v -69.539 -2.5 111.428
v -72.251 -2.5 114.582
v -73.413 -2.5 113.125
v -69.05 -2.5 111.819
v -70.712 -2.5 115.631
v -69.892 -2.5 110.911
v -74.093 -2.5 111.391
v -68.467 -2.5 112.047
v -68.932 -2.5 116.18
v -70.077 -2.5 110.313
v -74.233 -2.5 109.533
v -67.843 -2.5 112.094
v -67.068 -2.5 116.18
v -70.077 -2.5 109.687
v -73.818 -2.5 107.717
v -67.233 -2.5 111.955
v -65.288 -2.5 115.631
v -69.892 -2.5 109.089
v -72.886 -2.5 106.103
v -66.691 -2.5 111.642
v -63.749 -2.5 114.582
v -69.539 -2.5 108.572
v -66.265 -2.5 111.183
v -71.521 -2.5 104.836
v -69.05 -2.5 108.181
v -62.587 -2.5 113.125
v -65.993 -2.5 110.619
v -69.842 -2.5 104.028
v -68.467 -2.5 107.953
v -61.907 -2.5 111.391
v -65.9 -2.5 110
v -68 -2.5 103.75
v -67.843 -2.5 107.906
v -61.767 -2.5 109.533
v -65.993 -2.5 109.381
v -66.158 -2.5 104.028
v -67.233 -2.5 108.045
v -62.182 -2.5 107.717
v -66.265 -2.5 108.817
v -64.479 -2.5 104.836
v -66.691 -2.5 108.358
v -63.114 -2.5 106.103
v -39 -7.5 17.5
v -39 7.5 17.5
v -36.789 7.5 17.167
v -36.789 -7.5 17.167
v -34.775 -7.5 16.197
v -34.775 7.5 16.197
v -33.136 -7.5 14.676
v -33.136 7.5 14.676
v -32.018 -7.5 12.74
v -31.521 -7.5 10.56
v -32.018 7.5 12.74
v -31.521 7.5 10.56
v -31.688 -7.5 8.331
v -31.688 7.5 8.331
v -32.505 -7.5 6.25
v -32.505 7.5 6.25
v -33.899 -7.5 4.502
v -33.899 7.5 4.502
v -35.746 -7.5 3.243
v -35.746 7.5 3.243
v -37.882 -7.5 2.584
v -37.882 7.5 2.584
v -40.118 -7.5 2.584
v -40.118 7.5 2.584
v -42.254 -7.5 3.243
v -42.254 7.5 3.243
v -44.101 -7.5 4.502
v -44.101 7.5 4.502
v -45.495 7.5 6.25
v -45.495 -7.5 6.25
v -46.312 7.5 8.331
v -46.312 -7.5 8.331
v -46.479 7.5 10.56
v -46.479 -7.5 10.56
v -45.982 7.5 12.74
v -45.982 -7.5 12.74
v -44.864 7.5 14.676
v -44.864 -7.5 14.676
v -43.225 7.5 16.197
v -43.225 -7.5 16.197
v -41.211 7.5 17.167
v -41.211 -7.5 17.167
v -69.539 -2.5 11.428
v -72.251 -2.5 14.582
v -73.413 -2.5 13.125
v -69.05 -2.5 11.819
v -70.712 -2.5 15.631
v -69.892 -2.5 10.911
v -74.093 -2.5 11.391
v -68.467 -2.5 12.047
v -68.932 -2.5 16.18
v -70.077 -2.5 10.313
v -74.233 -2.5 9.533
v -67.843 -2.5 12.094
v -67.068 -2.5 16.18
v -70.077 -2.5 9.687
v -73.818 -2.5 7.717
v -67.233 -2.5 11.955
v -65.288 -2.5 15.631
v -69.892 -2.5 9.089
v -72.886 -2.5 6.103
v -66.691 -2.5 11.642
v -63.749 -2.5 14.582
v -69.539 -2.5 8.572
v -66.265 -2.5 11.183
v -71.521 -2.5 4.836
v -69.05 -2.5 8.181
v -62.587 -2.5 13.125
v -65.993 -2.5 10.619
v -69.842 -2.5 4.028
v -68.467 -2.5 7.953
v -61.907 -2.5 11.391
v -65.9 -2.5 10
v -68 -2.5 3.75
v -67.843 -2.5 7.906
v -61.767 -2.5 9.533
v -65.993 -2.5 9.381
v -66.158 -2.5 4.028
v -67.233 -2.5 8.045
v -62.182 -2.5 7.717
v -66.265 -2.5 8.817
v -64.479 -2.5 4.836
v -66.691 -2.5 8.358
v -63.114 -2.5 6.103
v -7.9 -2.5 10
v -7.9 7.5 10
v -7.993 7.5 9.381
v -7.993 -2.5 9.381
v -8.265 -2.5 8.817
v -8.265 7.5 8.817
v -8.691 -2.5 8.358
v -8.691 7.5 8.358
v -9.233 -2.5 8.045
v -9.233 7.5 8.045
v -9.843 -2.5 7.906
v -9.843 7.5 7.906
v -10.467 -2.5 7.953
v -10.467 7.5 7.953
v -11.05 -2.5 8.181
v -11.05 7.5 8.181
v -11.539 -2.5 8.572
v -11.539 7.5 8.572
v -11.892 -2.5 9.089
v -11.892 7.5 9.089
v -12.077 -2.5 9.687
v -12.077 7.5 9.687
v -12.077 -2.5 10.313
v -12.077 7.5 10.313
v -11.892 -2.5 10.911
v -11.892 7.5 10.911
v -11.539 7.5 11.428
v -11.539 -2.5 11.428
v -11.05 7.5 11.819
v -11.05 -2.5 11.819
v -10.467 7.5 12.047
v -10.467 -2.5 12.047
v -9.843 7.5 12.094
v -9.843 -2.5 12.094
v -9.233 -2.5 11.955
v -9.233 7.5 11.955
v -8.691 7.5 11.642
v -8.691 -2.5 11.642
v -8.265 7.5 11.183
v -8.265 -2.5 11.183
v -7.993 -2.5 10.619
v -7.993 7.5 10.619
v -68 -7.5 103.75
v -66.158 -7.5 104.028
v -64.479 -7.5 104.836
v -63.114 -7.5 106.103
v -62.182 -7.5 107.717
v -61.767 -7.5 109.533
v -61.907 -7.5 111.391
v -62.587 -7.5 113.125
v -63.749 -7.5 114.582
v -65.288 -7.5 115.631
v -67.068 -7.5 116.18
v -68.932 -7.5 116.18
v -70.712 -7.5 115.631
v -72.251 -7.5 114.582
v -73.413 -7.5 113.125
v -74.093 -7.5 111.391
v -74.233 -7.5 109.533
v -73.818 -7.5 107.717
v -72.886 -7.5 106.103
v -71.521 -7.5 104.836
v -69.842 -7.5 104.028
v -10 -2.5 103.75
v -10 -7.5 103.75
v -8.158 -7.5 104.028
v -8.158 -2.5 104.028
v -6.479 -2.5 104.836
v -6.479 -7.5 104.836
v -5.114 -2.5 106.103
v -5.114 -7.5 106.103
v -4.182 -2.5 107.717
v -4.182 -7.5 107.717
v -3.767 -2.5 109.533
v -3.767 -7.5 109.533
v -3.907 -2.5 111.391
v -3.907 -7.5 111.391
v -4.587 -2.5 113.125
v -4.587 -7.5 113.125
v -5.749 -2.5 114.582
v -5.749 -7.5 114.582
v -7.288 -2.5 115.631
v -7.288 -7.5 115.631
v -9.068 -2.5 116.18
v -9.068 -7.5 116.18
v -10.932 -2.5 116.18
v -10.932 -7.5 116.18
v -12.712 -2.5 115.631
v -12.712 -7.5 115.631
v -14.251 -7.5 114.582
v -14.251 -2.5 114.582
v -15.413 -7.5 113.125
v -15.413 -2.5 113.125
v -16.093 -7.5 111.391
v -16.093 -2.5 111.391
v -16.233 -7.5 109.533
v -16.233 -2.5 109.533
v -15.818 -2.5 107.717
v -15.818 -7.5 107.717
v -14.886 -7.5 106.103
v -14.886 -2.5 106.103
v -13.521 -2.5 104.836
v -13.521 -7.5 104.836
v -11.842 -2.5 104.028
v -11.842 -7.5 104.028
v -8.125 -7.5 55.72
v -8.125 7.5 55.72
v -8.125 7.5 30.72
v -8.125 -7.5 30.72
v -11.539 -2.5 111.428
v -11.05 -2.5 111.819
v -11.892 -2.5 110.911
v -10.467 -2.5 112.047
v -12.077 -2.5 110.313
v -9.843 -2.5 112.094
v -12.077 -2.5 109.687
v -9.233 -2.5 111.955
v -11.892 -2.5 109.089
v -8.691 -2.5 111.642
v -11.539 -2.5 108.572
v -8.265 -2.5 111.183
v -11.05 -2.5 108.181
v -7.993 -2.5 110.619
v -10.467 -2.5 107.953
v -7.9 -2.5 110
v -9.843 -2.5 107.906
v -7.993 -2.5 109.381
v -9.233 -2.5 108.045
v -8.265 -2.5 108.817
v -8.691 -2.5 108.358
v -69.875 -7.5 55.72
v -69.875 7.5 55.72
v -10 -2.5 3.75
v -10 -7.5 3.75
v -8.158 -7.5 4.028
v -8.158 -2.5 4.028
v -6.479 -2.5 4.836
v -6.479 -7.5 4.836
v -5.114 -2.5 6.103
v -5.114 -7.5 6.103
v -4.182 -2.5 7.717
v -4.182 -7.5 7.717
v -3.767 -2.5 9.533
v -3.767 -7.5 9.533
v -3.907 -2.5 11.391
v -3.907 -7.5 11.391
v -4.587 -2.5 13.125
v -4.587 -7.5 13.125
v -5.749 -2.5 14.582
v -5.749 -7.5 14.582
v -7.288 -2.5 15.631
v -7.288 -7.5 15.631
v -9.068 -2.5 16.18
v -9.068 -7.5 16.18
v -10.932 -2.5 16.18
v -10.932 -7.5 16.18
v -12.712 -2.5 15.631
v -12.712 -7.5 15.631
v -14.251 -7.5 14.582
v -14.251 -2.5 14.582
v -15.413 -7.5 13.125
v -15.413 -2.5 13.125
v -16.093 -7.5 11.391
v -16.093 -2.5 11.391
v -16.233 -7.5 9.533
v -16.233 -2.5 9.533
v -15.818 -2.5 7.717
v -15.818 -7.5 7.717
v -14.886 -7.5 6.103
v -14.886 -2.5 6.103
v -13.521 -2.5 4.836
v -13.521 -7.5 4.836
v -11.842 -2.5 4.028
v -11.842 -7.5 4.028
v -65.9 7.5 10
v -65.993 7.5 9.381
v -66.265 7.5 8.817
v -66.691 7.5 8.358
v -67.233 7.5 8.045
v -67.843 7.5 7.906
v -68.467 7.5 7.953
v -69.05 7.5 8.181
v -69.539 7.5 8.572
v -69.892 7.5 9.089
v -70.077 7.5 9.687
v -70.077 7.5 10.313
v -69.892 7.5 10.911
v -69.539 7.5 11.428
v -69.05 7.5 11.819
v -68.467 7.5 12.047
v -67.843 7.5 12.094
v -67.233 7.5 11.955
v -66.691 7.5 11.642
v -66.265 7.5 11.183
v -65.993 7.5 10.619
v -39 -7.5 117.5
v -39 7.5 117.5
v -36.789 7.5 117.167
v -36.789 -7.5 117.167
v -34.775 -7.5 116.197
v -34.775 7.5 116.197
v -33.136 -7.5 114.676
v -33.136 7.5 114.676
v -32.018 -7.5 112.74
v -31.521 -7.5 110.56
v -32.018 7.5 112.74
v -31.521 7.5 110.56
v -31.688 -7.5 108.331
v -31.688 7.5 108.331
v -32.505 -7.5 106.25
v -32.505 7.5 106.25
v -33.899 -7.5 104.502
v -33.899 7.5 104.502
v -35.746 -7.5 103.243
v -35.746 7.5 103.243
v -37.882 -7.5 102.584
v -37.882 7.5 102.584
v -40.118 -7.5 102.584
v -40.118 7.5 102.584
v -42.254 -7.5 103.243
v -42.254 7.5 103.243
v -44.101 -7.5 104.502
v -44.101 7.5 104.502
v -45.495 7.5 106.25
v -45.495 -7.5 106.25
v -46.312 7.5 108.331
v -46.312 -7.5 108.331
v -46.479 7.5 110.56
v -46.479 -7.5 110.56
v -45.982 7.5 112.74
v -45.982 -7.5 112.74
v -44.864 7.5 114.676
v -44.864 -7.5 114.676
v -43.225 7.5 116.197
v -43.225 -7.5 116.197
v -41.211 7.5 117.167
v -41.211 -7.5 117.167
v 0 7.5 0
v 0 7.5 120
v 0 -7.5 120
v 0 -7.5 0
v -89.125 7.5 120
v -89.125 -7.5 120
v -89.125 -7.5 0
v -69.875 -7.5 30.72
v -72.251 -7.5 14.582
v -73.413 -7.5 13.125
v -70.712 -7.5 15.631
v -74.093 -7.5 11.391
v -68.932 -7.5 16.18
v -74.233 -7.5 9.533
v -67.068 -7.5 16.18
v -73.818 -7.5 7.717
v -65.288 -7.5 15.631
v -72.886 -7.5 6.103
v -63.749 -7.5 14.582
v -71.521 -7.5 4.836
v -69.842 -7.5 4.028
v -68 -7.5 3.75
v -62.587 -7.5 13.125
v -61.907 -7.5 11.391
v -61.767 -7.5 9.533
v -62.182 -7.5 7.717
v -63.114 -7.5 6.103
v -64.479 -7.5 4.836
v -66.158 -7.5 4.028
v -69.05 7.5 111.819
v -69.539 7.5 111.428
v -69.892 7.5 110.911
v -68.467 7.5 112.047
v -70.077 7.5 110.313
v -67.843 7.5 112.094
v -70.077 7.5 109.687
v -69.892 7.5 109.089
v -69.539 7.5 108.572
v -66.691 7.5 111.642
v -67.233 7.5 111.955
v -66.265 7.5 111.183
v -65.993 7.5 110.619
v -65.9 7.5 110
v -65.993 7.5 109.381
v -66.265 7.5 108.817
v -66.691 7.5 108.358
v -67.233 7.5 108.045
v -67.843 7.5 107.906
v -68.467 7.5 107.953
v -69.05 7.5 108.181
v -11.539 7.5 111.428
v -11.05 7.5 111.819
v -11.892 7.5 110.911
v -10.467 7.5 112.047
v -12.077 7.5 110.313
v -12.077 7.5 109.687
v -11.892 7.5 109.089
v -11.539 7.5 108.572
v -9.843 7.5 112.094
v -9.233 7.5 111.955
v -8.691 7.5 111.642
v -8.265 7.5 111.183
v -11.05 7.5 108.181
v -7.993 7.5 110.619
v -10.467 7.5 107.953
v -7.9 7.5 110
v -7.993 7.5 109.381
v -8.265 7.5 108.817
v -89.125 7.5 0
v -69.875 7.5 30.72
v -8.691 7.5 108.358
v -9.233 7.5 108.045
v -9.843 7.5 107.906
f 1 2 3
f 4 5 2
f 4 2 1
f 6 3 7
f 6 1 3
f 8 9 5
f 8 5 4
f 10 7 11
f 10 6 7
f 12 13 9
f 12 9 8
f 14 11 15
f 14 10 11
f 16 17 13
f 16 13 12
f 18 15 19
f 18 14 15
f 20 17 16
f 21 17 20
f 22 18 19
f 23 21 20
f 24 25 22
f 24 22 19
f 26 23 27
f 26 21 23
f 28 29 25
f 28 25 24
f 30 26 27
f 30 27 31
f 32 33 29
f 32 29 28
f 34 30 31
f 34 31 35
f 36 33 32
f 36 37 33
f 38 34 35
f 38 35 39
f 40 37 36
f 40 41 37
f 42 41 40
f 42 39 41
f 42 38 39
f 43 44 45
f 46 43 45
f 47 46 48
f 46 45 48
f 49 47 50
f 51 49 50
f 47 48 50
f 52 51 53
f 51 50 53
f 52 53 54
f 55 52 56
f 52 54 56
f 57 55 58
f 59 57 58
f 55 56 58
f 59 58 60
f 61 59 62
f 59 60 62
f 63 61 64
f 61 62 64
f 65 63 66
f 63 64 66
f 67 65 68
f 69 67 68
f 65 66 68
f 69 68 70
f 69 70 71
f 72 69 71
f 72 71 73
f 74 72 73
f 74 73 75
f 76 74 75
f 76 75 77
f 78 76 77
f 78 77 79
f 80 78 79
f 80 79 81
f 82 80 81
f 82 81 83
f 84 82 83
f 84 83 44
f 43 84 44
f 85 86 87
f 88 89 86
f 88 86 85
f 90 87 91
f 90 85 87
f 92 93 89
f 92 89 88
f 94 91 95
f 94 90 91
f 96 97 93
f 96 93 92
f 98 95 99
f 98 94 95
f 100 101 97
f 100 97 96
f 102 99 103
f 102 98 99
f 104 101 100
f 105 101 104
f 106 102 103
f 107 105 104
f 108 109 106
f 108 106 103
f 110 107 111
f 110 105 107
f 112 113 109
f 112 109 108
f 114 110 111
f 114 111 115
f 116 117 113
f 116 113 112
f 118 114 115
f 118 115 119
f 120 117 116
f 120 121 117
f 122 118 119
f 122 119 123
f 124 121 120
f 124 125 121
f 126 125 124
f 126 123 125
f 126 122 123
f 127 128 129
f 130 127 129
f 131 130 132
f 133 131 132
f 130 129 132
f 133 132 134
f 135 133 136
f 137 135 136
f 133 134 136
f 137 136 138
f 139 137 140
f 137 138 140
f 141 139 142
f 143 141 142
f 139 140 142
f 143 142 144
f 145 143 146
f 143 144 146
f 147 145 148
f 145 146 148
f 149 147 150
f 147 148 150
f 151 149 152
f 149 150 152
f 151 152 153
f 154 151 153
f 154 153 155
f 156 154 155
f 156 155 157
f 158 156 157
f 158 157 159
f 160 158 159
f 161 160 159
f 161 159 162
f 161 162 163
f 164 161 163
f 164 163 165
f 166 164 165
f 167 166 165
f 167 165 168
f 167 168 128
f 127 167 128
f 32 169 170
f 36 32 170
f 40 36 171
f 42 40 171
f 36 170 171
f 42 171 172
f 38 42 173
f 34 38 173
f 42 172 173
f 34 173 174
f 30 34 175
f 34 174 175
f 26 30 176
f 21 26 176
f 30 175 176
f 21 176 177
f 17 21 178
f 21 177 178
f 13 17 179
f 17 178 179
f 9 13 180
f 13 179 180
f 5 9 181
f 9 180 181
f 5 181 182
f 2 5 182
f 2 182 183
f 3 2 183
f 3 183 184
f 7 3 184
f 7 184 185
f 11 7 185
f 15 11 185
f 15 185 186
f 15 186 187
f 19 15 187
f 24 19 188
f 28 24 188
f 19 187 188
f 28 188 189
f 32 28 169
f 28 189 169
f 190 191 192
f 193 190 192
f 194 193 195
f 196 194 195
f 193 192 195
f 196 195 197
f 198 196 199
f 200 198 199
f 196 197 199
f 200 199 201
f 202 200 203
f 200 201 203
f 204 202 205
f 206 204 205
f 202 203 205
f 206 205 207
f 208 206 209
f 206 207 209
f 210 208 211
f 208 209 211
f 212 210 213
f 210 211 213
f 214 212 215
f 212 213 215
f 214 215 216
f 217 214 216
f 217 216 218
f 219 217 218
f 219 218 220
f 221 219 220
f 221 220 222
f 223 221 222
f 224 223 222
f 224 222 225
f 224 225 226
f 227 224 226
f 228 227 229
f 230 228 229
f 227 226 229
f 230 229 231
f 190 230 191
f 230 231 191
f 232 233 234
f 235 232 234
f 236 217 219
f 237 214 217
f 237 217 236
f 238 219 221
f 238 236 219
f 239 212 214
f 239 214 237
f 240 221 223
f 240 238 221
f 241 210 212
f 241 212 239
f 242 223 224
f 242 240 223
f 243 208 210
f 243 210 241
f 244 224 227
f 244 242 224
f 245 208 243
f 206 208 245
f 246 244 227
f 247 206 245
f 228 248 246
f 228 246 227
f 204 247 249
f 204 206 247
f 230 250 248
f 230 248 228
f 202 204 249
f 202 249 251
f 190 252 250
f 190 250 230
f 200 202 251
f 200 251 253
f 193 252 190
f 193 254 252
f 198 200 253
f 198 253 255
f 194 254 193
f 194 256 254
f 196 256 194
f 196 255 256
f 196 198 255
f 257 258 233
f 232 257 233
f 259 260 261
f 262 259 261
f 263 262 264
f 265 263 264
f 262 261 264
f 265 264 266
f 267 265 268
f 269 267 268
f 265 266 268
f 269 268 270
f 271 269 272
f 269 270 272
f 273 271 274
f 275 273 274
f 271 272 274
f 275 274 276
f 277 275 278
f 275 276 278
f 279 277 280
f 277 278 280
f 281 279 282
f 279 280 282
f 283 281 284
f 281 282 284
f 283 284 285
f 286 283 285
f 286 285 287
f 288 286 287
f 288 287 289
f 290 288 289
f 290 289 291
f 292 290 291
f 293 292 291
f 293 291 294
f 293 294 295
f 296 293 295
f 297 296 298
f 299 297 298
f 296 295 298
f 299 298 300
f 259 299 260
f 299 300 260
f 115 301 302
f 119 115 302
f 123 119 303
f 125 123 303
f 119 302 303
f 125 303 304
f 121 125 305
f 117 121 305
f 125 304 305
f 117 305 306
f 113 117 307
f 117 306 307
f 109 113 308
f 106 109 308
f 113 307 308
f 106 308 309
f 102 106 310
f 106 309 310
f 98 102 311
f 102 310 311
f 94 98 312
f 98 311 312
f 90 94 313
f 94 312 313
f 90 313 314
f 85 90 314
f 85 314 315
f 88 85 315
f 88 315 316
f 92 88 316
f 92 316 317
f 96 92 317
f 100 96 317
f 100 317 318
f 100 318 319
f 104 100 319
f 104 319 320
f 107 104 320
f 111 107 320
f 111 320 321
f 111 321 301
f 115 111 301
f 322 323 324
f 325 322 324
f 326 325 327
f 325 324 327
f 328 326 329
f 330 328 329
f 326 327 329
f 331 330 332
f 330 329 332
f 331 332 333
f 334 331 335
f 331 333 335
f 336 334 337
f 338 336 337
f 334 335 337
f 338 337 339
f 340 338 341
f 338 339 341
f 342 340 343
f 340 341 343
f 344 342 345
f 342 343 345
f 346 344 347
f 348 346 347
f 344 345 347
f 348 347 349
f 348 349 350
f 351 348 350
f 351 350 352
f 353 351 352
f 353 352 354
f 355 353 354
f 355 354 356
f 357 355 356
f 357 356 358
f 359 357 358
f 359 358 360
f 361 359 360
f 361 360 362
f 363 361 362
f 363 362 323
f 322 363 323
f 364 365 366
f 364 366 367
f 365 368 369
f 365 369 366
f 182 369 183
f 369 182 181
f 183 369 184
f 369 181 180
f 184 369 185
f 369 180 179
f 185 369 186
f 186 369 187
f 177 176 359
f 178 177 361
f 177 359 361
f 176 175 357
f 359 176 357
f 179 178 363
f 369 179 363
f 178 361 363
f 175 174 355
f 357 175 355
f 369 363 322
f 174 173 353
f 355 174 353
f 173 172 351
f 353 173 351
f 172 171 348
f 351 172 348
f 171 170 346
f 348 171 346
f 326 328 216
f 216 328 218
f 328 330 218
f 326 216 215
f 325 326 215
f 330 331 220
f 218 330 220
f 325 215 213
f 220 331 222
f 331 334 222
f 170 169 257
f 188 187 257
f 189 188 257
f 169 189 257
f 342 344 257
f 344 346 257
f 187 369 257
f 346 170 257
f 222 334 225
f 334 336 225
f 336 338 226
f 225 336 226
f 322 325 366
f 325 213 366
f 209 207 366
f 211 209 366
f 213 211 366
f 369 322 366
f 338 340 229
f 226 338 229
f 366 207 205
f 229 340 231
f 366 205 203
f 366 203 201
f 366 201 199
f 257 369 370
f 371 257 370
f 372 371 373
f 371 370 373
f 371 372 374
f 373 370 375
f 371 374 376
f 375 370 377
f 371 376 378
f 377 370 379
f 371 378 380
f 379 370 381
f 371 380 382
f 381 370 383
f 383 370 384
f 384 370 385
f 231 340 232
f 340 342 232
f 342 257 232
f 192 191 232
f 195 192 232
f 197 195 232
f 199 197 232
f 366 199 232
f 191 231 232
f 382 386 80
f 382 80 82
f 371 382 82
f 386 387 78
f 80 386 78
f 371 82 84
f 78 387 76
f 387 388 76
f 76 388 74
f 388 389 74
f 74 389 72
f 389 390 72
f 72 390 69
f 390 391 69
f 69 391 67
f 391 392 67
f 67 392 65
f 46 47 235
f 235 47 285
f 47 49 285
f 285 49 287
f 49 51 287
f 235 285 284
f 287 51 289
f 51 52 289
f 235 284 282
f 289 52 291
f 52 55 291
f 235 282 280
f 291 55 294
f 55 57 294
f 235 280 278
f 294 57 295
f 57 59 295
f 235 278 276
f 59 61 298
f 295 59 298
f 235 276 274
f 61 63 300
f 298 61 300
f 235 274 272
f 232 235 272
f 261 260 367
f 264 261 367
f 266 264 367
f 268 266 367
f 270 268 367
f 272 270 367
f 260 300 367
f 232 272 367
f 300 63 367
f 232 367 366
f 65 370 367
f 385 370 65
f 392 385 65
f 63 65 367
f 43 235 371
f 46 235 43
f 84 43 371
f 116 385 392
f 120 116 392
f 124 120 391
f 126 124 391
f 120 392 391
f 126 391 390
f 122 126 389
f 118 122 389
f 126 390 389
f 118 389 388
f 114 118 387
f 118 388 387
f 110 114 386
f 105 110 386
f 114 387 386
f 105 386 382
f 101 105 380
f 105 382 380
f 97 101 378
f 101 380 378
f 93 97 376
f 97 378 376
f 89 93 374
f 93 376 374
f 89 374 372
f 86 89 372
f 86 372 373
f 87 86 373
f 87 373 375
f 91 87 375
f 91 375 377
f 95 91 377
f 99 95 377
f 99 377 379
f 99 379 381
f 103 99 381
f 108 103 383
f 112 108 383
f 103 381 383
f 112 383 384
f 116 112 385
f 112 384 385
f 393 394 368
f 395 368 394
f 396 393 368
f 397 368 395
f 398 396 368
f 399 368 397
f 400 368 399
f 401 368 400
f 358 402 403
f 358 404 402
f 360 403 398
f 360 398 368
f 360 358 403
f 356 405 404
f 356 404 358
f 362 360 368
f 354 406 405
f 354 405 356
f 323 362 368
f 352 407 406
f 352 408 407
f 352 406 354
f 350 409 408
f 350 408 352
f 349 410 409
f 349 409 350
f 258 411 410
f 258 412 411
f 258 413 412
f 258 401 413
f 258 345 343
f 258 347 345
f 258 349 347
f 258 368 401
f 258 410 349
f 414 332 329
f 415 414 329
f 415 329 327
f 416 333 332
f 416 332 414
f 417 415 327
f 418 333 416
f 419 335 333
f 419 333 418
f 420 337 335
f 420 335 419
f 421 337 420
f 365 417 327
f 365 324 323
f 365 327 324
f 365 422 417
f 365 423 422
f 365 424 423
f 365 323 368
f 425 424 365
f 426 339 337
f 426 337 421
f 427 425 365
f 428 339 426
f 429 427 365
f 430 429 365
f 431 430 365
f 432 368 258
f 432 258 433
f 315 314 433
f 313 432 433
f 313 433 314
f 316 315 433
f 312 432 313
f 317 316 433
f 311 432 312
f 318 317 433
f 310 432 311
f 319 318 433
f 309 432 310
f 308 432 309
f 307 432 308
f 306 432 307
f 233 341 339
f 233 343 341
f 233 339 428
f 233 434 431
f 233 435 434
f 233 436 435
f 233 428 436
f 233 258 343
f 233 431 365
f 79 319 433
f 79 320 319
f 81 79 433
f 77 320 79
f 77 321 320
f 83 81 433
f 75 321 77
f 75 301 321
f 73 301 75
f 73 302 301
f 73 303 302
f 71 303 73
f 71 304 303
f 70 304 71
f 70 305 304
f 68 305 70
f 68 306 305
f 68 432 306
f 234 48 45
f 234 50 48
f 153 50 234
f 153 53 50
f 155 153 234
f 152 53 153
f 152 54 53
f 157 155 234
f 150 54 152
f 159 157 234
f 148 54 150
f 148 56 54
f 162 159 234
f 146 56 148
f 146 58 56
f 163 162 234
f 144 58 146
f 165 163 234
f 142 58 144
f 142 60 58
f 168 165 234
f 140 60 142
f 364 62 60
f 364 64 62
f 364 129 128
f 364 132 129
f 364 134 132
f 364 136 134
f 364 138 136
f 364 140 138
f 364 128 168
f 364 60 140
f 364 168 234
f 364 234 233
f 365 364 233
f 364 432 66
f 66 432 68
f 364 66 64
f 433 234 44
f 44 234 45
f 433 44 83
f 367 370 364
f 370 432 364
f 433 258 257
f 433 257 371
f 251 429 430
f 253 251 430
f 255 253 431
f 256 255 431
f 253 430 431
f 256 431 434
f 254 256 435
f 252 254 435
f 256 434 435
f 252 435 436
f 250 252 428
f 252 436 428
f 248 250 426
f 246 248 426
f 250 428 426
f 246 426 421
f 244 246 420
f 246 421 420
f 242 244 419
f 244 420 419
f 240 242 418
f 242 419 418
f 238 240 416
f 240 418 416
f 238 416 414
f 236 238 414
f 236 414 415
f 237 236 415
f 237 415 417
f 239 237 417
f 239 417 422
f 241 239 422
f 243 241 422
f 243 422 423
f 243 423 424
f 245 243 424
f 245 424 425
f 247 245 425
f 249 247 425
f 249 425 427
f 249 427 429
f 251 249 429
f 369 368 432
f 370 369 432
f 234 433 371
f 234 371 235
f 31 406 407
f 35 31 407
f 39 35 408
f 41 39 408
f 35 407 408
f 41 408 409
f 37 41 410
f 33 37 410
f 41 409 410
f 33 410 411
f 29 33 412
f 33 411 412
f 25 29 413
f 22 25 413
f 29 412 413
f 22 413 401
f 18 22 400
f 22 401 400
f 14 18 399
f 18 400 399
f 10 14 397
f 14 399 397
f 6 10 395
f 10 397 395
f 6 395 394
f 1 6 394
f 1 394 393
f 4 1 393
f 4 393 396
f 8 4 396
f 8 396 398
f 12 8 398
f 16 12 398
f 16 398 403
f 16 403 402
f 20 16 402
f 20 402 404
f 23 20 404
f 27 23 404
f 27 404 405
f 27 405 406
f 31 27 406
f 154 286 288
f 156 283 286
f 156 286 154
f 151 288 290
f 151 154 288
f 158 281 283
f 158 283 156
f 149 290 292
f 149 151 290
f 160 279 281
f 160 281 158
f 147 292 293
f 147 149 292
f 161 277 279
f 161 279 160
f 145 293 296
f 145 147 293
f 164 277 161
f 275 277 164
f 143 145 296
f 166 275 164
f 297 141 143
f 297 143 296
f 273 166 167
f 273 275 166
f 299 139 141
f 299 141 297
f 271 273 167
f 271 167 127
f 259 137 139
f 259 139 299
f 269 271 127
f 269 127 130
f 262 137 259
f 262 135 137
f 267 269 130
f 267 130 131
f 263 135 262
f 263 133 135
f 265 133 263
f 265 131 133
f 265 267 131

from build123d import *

# Parameters (mm, degrees)
SKETCH1_W           = 89.125
SKETCH1_H           = 120
BOSS_EXTRUDE1_DEPTH = 7.5
CUT_EXTRUDE1_REACH  = 152.227
SKETCH3_W           = 61.75
SKETCH3_H           = 25
CUT_EXTRUDE2_REACH  = 152.227
SKETCH4_R           = 7.5
M5_TAPPED_HOLE1_D   = 4.2
SKETCH10_R          = 6.25
CUT_EXTRUDE3_DEPTH  = 5


with BuildPart() as part:
    # Sketch1 → Boss-Extrude1 (new, symmetric)
    with BuildSketch(Plane(origin=(0, 0, 0), x_dir=(1, 0, 0), z_dir=(0, 1, 0))):
        with Locations((-44.5625, -60)):
            Rectangle(SKETCH1_W, SKETCH1_H)
    extrude(amount=BOSS_EXTRUDE1_DEPTH, both=True)

    # Sketch3 → Cut-Extrude1 (cut, up to next)
    with BuildSketch(Plane(origin=(0, 7.5, 0), x_dir=(1, 0, 0), z_dir=(0, 1, 0)), mode=Mode.PRIVATE) as cut_extrude1_sk1:
        with Locations((-39, -43.22)):
            Rectangle(SKETCH3_W, SKETCH3_H)
    cut_extrude1_tool1 = extrude(cut_extrude1_sk1.sketch, amount=-CUT_EXTRUDE1_REACH, mode=Mode.PRIVATE) & part.part
    add(cut_extrude1_tool1.solids().sort_by_distance((-39, 7.5, 43.22))[0], mode=Mode.SUBTRACT)

    # Sketch4 → Cut-Extrude2 (cut, up to next)
    with BuildSketch(Plane(origin=(0, 7.5, 0), x_dir=(1, 0, 0), z_dir=(0, 1, 0)), mode=Mode.PRIVATE) as cut_extrude2_sk1:
        with Locations(Location((-39, -10, 0), (0, 0, 270))):
            Circle(SKETCH4_R)
    cut_extrude2_tool1 = extrude(cut_extrude2_sk1.sketch, amount=-CUT_EXTRUDE2_REACH, mode=Mode.PRIVATE) & part.part
    # Sketch4 → Cut-Extrude2 (cut, up to next)
    with BuildSketch(Plane(origin=(0, 7.5, 0), x_dir=(1, 0, 0), z_dir=(0, 1, 0)), mode=Mode.PRIVATE) as cut_extrude2_sk2:
        with Locations(Location((-39, -110, 0), (0, 0, 270))):
            Circle(SKETCH4_R)
    cut_extrude2_tool2 = extrude(cut_extrude2_sk2.sketch, amount=-CUT_EXTRUDE2_REACH, mode=Mode.PRIVATE) & part.part
    add(cut_extrude2_tool1.solids().sort_by_distance((-39, 7.5, 10))[0], mode=Mode.SUBTRACT)
    add(cut_extrude2_tool2.solids().sort_by_distance((-39, 7.5, 110))[0], mode=Mode.SUBTRACT)

    # M5 Tapped Hole1 (through all)
    with Locations(Plane(origin=(0, -7.5, 0), x_dir=(-1, 0, 0), z_dir=(0, -1, 0))):
        with Locations((10, -10), (68, -10), (68, -110), (10, -110)):
            Hole(M5_TAPPED_HOLE1_D / 2)

    # Sketch10 → Cut-Extrude3 (cut)
    with BuildSketch(Plane.XZ.offset(7.5)):
        with Locations(Location((-68, 110, 0), (0, 0, 270))):
            Circle(SKETCH10_R)
        with Locations(Location((-10, 110, 0), (0, 0, 270))):
            Circle(SKETCH10_R)
        with Locations(Location((-68, 10, 0), (0, 0, 270))):
            Circle(SKETCH10_R)
        with Locations(Location((-10, 10, 0), (0, 0, 270))):
            Circle(SKETCH10_R)
    extrude(amount=-CUT_EXTRUDE3_DEPTH, mode=Mode.SUBTRACT)


solid = part.part
